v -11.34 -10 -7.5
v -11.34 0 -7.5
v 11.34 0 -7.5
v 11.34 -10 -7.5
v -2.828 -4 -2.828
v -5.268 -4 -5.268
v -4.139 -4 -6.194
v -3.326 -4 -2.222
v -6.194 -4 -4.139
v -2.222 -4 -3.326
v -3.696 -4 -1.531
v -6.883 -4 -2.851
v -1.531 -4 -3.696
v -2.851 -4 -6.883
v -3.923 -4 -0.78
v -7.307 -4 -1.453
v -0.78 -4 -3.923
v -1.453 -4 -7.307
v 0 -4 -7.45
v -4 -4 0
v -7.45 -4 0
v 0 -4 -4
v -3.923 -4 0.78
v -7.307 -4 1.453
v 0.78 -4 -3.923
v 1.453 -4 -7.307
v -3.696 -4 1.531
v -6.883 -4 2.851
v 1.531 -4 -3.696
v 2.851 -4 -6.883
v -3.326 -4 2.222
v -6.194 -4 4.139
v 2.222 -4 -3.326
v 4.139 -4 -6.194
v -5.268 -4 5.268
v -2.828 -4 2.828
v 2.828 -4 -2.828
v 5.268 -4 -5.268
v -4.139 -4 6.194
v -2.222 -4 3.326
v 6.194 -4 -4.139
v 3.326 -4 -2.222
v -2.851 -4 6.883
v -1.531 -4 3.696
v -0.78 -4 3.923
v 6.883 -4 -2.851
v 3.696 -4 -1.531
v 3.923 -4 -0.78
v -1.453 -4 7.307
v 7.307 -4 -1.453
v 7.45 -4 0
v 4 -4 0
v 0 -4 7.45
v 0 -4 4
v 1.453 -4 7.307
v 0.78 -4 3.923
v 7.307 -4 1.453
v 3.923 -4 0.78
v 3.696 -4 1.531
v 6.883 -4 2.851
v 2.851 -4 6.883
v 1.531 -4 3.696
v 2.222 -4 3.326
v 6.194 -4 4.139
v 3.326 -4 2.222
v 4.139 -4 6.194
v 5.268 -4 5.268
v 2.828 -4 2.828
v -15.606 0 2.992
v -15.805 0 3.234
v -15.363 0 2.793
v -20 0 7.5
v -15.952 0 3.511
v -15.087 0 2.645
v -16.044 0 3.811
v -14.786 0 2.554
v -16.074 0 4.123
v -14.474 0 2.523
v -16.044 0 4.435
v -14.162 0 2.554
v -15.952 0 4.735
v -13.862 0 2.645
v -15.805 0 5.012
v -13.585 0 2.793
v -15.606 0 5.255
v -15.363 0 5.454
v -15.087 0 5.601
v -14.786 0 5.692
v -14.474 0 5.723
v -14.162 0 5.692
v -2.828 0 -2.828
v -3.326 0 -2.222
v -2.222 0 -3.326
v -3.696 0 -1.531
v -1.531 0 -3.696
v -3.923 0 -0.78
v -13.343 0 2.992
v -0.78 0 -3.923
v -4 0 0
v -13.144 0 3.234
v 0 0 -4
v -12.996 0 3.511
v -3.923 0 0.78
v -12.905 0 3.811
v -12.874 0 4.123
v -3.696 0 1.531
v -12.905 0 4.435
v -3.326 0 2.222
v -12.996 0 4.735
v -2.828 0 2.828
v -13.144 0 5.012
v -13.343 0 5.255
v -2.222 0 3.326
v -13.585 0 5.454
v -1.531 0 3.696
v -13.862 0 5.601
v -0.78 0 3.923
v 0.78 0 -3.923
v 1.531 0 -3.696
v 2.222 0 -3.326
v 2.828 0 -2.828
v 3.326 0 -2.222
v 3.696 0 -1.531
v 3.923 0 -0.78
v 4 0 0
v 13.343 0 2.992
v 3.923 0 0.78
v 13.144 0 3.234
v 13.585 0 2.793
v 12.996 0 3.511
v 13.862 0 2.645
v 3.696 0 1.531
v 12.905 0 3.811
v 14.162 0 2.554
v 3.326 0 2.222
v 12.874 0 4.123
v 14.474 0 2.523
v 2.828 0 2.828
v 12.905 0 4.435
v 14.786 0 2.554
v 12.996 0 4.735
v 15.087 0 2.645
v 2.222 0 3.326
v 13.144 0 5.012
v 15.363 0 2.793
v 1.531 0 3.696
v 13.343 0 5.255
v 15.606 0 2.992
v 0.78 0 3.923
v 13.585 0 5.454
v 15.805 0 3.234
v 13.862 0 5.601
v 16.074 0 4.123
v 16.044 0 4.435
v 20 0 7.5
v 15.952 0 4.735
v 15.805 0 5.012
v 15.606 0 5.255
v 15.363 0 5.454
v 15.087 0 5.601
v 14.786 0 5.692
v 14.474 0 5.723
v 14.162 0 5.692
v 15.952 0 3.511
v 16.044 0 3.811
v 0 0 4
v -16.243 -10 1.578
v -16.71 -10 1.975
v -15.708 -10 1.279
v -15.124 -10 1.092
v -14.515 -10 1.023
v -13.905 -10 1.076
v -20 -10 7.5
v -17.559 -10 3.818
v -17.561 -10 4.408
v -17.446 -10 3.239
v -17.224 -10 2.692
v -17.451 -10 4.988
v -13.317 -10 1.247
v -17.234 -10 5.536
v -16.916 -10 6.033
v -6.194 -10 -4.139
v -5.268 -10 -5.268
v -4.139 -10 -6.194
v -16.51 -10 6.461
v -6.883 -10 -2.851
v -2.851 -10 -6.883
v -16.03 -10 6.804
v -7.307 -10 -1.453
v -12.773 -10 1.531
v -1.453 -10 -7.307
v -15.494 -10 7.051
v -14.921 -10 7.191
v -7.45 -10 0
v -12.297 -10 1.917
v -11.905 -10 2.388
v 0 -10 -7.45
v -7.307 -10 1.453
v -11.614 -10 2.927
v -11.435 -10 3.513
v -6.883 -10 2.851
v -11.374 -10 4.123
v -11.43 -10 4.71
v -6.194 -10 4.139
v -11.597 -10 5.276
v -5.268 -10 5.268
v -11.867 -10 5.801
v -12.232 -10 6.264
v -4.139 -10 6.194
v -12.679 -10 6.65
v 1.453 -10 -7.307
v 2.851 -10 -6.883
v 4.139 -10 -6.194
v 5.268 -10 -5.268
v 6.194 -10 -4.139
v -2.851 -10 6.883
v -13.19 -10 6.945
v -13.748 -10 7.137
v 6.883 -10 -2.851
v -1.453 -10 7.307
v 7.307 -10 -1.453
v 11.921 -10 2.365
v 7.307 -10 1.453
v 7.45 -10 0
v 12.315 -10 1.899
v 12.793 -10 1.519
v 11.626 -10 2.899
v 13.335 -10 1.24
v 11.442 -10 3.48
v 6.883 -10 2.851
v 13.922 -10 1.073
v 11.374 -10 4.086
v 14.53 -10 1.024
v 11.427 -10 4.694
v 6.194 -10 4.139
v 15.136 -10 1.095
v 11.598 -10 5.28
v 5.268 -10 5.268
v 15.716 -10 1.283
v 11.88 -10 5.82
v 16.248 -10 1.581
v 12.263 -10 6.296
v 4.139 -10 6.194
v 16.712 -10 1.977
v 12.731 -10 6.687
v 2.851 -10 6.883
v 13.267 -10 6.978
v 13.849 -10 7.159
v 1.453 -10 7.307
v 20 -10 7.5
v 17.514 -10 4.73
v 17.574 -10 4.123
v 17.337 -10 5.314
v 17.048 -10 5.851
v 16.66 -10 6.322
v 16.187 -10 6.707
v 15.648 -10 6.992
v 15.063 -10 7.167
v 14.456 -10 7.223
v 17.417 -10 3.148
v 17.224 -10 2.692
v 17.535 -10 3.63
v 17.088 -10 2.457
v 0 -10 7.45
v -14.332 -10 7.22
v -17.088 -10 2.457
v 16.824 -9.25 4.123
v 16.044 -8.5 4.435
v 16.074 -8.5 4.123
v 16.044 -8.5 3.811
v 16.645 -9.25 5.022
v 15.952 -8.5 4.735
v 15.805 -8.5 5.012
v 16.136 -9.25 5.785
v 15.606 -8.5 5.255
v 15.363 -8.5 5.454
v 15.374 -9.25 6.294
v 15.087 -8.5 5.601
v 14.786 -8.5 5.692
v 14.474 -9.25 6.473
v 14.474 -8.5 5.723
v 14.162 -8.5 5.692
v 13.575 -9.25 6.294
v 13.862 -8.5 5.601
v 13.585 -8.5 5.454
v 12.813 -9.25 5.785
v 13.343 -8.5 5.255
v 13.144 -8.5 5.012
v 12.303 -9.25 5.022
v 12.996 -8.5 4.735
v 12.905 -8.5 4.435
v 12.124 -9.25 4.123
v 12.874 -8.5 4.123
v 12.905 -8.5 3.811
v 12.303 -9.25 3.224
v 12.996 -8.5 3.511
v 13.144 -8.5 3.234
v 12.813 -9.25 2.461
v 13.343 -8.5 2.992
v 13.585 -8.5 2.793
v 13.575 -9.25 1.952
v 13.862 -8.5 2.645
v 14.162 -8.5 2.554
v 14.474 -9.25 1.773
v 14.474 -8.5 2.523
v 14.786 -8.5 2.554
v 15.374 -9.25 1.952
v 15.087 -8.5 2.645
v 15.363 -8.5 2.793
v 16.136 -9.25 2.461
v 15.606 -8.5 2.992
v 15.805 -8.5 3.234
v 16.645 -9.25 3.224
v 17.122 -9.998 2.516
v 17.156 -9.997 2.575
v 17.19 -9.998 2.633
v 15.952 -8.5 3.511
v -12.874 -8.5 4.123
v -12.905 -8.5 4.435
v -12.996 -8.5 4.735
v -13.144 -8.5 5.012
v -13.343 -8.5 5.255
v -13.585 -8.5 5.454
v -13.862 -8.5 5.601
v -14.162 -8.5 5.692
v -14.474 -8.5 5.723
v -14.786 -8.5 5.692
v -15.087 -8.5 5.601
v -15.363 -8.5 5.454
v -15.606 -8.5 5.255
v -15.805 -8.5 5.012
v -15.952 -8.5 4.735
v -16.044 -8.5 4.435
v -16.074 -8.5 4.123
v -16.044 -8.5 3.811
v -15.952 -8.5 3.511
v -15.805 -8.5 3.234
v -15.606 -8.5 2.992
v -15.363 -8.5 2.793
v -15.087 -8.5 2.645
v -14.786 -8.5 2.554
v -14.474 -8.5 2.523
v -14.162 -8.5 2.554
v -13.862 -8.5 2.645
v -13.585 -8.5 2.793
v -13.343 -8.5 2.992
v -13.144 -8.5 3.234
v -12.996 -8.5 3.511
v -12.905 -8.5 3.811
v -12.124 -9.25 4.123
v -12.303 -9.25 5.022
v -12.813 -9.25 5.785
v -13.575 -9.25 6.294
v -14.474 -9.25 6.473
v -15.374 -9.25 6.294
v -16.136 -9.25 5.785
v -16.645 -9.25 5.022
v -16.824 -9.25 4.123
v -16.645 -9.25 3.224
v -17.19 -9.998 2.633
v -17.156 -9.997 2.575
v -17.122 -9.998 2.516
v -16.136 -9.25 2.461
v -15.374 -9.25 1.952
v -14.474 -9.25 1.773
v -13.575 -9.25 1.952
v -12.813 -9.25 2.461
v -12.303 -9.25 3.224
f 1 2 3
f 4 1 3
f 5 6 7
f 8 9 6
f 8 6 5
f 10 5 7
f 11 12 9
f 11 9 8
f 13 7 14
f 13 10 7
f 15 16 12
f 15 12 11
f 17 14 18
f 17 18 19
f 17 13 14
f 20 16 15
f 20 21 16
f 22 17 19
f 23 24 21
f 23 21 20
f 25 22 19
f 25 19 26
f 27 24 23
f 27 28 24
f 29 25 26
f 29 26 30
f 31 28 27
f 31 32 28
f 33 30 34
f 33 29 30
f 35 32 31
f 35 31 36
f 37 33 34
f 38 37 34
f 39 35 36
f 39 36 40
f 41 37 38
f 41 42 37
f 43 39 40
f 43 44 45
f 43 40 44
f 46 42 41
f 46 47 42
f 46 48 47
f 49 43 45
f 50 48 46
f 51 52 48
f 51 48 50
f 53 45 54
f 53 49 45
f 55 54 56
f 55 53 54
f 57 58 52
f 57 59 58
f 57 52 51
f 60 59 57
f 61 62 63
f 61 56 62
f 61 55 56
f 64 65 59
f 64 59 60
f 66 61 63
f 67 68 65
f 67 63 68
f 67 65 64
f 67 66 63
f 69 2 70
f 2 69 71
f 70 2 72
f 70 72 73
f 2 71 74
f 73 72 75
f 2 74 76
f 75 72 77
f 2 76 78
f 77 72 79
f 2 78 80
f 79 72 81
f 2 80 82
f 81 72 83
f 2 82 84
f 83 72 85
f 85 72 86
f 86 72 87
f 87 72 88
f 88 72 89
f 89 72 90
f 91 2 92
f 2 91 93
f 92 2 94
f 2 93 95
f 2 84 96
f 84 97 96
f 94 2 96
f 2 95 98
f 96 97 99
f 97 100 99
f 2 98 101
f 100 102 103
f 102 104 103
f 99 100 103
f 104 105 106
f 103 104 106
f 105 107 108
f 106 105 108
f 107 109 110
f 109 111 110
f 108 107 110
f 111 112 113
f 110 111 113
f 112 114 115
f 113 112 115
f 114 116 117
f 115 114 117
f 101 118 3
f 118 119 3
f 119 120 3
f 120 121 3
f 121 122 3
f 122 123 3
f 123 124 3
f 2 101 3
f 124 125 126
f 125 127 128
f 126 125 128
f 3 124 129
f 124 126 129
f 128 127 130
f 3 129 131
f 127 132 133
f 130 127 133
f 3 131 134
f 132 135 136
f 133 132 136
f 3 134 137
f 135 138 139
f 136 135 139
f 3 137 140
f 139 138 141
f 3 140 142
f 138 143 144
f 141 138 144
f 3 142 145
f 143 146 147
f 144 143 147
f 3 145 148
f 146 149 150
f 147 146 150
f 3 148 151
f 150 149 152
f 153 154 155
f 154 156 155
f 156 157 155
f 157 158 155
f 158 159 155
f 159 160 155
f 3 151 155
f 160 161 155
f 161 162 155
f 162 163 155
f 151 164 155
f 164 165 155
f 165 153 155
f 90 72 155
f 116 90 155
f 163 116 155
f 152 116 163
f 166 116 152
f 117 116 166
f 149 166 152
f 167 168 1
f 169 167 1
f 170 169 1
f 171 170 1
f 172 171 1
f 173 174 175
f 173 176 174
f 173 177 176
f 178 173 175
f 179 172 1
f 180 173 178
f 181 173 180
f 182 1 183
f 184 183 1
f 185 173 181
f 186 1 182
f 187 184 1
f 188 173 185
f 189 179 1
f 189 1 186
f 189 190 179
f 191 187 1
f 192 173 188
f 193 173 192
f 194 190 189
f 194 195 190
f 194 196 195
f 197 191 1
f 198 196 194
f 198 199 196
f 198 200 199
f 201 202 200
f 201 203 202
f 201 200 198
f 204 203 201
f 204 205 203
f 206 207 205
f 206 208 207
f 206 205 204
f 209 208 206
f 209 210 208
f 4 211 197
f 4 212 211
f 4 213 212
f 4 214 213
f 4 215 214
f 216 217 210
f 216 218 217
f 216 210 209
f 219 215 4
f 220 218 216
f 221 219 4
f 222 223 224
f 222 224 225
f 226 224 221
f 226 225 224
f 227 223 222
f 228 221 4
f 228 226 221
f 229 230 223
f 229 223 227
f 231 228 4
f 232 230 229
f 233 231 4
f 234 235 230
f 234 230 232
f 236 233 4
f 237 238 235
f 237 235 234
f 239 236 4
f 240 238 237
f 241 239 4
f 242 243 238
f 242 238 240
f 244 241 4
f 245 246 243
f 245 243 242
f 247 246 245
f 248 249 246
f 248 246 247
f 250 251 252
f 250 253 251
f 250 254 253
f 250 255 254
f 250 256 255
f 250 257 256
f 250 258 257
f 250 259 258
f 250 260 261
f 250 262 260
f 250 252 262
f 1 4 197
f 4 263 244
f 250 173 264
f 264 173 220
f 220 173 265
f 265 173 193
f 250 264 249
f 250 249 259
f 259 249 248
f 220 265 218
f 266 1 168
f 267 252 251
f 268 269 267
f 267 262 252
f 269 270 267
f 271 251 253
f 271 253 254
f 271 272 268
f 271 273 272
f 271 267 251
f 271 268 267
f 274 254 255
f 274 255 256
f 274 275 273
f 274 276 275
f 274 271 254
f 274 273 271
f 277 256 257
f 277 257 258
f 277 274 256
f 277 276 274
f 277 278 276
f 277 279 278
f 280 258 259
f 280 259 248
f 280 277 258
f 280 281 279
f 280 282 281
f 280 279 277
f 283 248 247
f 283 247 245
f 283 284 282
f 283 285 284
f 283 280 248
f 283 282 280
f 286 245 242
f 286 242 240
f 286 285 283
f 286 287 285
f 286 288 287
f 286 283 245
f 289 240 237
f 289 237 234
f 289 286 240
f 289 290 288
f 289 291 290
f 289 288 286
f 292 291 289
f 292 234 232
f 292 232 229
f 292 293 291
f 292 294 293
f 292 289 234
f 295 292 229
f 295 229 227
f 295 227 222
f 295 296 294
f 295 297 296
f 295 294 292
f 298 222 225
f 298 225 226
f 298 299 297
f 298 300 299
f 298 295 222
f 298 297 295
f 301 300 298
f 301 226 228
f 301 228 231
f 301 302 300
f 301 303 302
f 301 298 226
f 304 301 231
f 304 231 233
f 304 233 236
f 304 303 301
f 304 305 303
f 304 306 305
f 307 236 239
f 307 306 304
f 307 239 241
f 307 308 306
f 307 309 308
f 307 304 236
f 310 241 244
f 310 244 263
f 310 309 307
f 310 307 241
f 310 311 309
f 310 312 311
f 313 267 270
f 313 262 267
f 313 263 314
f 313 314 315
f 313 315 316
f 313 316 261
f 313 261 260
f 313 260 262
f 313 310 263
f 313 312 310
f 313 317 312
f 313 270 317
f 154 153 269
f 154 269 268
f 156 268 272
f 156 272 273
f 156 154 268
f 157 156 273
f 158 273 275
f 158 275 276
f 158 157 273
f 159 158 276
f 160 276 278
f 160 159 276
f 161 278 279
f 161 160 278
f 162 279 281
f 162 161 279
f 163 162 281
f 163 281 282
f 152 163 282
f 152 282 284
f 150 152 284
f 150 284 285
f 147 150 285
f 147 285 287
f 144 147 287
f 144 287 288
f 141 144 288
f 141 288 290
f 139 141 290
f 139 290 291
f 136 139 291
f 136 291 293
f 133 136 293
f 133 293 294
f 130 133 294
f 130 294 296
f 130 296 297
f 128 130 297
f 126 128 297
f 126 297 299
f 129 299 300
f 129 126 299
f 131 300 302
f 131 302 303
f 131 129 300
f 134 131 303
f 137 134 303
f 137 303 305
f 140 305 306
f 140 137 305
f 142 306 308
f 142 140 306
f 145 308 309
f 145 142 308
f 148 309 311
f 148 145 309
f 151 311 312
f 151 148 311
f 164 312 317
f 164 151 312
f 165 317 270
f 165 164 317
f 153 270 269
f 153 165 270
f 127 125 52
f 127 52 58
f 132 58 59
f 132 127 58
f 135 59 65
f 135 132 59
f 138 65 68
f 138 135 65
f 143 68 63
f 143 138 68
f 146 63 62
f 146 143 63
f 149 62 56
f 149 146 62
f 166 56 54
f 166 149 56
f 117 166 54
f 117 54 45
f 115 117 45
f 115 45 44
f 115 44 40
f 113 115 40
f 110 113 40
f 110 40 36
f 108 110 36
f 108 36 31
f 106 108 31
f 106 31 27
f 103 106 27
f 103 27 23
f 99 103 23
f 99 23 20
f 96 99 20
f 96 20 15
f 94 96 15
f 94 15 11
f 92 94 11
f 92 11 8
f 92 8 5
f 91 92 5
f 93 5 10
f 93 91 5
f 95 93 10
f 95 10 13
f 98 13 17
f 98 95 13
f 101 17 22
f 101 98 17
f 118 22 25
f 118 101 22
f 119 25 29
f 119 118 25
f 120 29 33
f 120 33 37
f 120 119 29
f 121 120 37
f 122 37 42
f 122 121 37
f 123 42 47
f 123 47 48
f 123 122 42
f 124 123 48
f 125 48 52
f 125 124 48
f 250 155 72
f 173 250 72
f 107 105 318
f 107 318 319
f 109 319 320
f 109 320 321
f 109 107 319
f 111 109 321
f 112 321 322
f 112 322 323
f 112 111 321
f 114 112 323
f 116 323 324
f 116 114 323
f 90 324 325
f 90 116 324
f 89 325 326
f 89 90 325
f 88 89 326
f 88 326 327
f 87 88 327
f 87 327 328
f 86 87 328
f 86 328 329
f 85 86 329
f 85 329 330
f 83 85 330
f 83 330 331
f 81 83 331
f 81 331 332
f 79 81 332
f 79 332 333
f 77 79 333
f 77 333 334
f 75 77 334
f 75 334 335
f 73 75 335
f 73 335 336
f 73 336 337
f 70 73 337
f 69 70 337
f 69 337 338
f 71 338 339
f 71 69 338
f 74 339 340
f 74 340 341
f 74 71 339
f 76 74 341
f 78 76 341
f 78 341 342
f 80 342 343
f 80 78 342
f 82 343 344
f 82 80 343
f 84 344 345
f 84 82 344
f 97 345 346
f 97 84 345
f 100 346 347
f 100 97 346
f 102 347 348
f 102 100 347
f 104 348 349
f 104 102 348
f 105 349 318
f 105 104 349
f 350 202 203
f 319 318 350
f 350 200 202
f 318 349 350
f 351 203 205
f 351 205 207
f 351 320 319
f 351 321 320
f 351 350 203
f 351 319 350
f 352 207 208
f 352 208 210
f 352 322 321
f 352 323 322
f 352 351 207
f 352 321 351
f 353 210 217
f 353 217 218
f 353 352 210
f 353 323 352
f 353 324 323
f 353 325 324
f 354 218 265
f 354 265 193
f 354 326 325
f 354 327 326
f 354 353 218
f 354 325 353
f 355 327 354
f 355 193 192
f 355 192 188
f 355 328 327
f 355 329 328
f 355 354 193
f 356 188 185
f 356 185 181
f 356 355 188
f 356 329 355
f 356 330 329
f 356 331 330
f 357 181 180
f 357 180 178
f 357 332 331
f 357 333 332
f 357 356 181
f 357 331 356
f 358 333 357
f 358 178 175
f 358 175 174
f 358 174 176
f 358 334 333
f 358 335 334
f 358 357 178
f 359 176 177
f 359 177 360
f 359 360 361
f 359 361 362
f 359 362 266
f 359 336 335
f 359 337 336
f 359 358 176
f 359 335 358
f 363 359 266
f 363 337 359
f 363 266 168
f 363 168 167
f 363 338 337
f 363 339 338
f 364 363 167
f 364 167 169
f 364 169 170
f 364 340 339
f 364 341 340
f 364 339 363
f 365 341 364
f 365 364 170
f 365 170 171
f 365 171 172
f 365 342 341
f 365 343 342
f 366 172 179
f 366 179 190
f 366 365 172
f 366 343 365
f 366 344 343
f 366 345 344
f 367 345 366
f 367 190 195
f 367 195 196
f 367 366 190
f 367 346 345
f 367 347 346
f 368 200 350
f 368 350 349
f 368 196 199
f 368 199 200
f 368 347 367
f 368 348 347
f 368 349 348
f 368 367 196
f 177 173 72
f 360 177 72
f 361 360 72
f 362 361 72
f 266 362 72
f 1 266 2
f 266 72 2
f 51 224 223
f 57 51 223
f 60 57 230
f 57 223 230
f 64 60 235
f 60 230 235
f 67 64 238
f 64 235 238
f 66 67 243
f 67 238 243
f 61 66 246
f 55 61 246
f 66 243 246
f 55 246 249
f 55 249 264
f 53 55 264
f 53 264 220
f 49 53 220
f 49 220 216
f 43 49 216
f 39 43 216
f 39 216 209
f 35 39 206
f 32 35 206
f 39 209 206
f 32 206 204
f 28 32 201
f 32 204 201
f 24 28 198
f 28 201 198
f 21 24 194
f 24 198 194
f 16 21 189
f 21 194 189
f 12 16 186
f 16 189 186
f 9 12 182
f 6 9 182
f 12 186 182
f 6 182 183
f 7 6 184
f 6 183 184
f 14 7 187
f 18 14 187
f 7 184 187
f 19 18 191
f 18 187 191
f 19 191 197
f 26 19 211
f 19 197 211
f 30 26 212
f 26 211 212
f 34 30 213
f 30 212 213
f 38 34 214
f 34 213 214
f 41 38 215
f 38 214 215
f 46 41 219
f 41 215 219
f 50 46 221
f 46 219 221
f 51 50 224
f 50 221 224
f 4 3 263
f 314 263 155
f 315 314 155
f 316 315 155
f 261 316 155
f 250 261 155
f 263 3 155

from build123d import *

# Parameters (mm, degrees)
F0_R     = 1.6
F0_R_2   = 4
F1_DEPTH = 10
F2_R     = 7.45
F2_R_2   = 4
F3_DEPTH = 6


# Not quite as in the source:
# - a fillet or chamfer that OpenCascade refuses, or shapes differently, is made with other operations: its cross-section is extruded or revolved along the edge and cut away or added


with BuildPart() as f1:
    # F0 (on Front) → F1 (new body)
    with BuildSketch(Plane.XZ):
        Polygon((20, 7.5), (-20, 7.5), (-11.3397459622, -7.5), (11.3397459622, -7.5), align=None)
        with Locations((-14.4742550328, 4.1231745854)):
            Circle(F0_R, mode=Mode.SUBTRACT)
        Circle(F0_R_2, mode=Mode.SUBTRACT)
        with Locations((14.4742550328, 4.1231745854)):
            Circle(F0_R, mode=Mode.SUBTRACT)
    extrude(amount=F1_DEPTH)

    # F2 (on face) → F3 (cut)
    with BuildSketch(Plane.XZ.offset(10)):
        Circle(F2_R)
        Circle(F2_R_2, mode=Mode.SUBTRACT)
    extrude(amount=-F3_DEPTH, mode=Mode.SUBTRACT)

    # F4: chamfer of 1.5 on 2 edges, made by hand

    # F4_s1 → F4_t2 (revolve, cut)
    with BuildSketch(Plane.XY.offset(4.1231745854)):
        Polygon((-11.3742550328, -10), (-12.8742550328, -8.5), (-12.8742550328, -10), align=None)
    revolve(axis=Axis((-14.4742550328, -10, 4.1231745854), (0, -1, 0)), mode=Mode.SUBTRACT)

    # F4_s3 → F4_t4 (revolve, cut)
    with BuildSketch(Plane.XY.offset(4.1231745854)):
        Polygon((17.5742550328, -10), (16.0742550328, -8.5), (16.0742550328, -10), align=None)
    revolve(axis=Axis((14.4742550328, -10, 4.1231745854), (0, -1, 0)), mode=Mode.SUBTRACT)


solid = f1.part
